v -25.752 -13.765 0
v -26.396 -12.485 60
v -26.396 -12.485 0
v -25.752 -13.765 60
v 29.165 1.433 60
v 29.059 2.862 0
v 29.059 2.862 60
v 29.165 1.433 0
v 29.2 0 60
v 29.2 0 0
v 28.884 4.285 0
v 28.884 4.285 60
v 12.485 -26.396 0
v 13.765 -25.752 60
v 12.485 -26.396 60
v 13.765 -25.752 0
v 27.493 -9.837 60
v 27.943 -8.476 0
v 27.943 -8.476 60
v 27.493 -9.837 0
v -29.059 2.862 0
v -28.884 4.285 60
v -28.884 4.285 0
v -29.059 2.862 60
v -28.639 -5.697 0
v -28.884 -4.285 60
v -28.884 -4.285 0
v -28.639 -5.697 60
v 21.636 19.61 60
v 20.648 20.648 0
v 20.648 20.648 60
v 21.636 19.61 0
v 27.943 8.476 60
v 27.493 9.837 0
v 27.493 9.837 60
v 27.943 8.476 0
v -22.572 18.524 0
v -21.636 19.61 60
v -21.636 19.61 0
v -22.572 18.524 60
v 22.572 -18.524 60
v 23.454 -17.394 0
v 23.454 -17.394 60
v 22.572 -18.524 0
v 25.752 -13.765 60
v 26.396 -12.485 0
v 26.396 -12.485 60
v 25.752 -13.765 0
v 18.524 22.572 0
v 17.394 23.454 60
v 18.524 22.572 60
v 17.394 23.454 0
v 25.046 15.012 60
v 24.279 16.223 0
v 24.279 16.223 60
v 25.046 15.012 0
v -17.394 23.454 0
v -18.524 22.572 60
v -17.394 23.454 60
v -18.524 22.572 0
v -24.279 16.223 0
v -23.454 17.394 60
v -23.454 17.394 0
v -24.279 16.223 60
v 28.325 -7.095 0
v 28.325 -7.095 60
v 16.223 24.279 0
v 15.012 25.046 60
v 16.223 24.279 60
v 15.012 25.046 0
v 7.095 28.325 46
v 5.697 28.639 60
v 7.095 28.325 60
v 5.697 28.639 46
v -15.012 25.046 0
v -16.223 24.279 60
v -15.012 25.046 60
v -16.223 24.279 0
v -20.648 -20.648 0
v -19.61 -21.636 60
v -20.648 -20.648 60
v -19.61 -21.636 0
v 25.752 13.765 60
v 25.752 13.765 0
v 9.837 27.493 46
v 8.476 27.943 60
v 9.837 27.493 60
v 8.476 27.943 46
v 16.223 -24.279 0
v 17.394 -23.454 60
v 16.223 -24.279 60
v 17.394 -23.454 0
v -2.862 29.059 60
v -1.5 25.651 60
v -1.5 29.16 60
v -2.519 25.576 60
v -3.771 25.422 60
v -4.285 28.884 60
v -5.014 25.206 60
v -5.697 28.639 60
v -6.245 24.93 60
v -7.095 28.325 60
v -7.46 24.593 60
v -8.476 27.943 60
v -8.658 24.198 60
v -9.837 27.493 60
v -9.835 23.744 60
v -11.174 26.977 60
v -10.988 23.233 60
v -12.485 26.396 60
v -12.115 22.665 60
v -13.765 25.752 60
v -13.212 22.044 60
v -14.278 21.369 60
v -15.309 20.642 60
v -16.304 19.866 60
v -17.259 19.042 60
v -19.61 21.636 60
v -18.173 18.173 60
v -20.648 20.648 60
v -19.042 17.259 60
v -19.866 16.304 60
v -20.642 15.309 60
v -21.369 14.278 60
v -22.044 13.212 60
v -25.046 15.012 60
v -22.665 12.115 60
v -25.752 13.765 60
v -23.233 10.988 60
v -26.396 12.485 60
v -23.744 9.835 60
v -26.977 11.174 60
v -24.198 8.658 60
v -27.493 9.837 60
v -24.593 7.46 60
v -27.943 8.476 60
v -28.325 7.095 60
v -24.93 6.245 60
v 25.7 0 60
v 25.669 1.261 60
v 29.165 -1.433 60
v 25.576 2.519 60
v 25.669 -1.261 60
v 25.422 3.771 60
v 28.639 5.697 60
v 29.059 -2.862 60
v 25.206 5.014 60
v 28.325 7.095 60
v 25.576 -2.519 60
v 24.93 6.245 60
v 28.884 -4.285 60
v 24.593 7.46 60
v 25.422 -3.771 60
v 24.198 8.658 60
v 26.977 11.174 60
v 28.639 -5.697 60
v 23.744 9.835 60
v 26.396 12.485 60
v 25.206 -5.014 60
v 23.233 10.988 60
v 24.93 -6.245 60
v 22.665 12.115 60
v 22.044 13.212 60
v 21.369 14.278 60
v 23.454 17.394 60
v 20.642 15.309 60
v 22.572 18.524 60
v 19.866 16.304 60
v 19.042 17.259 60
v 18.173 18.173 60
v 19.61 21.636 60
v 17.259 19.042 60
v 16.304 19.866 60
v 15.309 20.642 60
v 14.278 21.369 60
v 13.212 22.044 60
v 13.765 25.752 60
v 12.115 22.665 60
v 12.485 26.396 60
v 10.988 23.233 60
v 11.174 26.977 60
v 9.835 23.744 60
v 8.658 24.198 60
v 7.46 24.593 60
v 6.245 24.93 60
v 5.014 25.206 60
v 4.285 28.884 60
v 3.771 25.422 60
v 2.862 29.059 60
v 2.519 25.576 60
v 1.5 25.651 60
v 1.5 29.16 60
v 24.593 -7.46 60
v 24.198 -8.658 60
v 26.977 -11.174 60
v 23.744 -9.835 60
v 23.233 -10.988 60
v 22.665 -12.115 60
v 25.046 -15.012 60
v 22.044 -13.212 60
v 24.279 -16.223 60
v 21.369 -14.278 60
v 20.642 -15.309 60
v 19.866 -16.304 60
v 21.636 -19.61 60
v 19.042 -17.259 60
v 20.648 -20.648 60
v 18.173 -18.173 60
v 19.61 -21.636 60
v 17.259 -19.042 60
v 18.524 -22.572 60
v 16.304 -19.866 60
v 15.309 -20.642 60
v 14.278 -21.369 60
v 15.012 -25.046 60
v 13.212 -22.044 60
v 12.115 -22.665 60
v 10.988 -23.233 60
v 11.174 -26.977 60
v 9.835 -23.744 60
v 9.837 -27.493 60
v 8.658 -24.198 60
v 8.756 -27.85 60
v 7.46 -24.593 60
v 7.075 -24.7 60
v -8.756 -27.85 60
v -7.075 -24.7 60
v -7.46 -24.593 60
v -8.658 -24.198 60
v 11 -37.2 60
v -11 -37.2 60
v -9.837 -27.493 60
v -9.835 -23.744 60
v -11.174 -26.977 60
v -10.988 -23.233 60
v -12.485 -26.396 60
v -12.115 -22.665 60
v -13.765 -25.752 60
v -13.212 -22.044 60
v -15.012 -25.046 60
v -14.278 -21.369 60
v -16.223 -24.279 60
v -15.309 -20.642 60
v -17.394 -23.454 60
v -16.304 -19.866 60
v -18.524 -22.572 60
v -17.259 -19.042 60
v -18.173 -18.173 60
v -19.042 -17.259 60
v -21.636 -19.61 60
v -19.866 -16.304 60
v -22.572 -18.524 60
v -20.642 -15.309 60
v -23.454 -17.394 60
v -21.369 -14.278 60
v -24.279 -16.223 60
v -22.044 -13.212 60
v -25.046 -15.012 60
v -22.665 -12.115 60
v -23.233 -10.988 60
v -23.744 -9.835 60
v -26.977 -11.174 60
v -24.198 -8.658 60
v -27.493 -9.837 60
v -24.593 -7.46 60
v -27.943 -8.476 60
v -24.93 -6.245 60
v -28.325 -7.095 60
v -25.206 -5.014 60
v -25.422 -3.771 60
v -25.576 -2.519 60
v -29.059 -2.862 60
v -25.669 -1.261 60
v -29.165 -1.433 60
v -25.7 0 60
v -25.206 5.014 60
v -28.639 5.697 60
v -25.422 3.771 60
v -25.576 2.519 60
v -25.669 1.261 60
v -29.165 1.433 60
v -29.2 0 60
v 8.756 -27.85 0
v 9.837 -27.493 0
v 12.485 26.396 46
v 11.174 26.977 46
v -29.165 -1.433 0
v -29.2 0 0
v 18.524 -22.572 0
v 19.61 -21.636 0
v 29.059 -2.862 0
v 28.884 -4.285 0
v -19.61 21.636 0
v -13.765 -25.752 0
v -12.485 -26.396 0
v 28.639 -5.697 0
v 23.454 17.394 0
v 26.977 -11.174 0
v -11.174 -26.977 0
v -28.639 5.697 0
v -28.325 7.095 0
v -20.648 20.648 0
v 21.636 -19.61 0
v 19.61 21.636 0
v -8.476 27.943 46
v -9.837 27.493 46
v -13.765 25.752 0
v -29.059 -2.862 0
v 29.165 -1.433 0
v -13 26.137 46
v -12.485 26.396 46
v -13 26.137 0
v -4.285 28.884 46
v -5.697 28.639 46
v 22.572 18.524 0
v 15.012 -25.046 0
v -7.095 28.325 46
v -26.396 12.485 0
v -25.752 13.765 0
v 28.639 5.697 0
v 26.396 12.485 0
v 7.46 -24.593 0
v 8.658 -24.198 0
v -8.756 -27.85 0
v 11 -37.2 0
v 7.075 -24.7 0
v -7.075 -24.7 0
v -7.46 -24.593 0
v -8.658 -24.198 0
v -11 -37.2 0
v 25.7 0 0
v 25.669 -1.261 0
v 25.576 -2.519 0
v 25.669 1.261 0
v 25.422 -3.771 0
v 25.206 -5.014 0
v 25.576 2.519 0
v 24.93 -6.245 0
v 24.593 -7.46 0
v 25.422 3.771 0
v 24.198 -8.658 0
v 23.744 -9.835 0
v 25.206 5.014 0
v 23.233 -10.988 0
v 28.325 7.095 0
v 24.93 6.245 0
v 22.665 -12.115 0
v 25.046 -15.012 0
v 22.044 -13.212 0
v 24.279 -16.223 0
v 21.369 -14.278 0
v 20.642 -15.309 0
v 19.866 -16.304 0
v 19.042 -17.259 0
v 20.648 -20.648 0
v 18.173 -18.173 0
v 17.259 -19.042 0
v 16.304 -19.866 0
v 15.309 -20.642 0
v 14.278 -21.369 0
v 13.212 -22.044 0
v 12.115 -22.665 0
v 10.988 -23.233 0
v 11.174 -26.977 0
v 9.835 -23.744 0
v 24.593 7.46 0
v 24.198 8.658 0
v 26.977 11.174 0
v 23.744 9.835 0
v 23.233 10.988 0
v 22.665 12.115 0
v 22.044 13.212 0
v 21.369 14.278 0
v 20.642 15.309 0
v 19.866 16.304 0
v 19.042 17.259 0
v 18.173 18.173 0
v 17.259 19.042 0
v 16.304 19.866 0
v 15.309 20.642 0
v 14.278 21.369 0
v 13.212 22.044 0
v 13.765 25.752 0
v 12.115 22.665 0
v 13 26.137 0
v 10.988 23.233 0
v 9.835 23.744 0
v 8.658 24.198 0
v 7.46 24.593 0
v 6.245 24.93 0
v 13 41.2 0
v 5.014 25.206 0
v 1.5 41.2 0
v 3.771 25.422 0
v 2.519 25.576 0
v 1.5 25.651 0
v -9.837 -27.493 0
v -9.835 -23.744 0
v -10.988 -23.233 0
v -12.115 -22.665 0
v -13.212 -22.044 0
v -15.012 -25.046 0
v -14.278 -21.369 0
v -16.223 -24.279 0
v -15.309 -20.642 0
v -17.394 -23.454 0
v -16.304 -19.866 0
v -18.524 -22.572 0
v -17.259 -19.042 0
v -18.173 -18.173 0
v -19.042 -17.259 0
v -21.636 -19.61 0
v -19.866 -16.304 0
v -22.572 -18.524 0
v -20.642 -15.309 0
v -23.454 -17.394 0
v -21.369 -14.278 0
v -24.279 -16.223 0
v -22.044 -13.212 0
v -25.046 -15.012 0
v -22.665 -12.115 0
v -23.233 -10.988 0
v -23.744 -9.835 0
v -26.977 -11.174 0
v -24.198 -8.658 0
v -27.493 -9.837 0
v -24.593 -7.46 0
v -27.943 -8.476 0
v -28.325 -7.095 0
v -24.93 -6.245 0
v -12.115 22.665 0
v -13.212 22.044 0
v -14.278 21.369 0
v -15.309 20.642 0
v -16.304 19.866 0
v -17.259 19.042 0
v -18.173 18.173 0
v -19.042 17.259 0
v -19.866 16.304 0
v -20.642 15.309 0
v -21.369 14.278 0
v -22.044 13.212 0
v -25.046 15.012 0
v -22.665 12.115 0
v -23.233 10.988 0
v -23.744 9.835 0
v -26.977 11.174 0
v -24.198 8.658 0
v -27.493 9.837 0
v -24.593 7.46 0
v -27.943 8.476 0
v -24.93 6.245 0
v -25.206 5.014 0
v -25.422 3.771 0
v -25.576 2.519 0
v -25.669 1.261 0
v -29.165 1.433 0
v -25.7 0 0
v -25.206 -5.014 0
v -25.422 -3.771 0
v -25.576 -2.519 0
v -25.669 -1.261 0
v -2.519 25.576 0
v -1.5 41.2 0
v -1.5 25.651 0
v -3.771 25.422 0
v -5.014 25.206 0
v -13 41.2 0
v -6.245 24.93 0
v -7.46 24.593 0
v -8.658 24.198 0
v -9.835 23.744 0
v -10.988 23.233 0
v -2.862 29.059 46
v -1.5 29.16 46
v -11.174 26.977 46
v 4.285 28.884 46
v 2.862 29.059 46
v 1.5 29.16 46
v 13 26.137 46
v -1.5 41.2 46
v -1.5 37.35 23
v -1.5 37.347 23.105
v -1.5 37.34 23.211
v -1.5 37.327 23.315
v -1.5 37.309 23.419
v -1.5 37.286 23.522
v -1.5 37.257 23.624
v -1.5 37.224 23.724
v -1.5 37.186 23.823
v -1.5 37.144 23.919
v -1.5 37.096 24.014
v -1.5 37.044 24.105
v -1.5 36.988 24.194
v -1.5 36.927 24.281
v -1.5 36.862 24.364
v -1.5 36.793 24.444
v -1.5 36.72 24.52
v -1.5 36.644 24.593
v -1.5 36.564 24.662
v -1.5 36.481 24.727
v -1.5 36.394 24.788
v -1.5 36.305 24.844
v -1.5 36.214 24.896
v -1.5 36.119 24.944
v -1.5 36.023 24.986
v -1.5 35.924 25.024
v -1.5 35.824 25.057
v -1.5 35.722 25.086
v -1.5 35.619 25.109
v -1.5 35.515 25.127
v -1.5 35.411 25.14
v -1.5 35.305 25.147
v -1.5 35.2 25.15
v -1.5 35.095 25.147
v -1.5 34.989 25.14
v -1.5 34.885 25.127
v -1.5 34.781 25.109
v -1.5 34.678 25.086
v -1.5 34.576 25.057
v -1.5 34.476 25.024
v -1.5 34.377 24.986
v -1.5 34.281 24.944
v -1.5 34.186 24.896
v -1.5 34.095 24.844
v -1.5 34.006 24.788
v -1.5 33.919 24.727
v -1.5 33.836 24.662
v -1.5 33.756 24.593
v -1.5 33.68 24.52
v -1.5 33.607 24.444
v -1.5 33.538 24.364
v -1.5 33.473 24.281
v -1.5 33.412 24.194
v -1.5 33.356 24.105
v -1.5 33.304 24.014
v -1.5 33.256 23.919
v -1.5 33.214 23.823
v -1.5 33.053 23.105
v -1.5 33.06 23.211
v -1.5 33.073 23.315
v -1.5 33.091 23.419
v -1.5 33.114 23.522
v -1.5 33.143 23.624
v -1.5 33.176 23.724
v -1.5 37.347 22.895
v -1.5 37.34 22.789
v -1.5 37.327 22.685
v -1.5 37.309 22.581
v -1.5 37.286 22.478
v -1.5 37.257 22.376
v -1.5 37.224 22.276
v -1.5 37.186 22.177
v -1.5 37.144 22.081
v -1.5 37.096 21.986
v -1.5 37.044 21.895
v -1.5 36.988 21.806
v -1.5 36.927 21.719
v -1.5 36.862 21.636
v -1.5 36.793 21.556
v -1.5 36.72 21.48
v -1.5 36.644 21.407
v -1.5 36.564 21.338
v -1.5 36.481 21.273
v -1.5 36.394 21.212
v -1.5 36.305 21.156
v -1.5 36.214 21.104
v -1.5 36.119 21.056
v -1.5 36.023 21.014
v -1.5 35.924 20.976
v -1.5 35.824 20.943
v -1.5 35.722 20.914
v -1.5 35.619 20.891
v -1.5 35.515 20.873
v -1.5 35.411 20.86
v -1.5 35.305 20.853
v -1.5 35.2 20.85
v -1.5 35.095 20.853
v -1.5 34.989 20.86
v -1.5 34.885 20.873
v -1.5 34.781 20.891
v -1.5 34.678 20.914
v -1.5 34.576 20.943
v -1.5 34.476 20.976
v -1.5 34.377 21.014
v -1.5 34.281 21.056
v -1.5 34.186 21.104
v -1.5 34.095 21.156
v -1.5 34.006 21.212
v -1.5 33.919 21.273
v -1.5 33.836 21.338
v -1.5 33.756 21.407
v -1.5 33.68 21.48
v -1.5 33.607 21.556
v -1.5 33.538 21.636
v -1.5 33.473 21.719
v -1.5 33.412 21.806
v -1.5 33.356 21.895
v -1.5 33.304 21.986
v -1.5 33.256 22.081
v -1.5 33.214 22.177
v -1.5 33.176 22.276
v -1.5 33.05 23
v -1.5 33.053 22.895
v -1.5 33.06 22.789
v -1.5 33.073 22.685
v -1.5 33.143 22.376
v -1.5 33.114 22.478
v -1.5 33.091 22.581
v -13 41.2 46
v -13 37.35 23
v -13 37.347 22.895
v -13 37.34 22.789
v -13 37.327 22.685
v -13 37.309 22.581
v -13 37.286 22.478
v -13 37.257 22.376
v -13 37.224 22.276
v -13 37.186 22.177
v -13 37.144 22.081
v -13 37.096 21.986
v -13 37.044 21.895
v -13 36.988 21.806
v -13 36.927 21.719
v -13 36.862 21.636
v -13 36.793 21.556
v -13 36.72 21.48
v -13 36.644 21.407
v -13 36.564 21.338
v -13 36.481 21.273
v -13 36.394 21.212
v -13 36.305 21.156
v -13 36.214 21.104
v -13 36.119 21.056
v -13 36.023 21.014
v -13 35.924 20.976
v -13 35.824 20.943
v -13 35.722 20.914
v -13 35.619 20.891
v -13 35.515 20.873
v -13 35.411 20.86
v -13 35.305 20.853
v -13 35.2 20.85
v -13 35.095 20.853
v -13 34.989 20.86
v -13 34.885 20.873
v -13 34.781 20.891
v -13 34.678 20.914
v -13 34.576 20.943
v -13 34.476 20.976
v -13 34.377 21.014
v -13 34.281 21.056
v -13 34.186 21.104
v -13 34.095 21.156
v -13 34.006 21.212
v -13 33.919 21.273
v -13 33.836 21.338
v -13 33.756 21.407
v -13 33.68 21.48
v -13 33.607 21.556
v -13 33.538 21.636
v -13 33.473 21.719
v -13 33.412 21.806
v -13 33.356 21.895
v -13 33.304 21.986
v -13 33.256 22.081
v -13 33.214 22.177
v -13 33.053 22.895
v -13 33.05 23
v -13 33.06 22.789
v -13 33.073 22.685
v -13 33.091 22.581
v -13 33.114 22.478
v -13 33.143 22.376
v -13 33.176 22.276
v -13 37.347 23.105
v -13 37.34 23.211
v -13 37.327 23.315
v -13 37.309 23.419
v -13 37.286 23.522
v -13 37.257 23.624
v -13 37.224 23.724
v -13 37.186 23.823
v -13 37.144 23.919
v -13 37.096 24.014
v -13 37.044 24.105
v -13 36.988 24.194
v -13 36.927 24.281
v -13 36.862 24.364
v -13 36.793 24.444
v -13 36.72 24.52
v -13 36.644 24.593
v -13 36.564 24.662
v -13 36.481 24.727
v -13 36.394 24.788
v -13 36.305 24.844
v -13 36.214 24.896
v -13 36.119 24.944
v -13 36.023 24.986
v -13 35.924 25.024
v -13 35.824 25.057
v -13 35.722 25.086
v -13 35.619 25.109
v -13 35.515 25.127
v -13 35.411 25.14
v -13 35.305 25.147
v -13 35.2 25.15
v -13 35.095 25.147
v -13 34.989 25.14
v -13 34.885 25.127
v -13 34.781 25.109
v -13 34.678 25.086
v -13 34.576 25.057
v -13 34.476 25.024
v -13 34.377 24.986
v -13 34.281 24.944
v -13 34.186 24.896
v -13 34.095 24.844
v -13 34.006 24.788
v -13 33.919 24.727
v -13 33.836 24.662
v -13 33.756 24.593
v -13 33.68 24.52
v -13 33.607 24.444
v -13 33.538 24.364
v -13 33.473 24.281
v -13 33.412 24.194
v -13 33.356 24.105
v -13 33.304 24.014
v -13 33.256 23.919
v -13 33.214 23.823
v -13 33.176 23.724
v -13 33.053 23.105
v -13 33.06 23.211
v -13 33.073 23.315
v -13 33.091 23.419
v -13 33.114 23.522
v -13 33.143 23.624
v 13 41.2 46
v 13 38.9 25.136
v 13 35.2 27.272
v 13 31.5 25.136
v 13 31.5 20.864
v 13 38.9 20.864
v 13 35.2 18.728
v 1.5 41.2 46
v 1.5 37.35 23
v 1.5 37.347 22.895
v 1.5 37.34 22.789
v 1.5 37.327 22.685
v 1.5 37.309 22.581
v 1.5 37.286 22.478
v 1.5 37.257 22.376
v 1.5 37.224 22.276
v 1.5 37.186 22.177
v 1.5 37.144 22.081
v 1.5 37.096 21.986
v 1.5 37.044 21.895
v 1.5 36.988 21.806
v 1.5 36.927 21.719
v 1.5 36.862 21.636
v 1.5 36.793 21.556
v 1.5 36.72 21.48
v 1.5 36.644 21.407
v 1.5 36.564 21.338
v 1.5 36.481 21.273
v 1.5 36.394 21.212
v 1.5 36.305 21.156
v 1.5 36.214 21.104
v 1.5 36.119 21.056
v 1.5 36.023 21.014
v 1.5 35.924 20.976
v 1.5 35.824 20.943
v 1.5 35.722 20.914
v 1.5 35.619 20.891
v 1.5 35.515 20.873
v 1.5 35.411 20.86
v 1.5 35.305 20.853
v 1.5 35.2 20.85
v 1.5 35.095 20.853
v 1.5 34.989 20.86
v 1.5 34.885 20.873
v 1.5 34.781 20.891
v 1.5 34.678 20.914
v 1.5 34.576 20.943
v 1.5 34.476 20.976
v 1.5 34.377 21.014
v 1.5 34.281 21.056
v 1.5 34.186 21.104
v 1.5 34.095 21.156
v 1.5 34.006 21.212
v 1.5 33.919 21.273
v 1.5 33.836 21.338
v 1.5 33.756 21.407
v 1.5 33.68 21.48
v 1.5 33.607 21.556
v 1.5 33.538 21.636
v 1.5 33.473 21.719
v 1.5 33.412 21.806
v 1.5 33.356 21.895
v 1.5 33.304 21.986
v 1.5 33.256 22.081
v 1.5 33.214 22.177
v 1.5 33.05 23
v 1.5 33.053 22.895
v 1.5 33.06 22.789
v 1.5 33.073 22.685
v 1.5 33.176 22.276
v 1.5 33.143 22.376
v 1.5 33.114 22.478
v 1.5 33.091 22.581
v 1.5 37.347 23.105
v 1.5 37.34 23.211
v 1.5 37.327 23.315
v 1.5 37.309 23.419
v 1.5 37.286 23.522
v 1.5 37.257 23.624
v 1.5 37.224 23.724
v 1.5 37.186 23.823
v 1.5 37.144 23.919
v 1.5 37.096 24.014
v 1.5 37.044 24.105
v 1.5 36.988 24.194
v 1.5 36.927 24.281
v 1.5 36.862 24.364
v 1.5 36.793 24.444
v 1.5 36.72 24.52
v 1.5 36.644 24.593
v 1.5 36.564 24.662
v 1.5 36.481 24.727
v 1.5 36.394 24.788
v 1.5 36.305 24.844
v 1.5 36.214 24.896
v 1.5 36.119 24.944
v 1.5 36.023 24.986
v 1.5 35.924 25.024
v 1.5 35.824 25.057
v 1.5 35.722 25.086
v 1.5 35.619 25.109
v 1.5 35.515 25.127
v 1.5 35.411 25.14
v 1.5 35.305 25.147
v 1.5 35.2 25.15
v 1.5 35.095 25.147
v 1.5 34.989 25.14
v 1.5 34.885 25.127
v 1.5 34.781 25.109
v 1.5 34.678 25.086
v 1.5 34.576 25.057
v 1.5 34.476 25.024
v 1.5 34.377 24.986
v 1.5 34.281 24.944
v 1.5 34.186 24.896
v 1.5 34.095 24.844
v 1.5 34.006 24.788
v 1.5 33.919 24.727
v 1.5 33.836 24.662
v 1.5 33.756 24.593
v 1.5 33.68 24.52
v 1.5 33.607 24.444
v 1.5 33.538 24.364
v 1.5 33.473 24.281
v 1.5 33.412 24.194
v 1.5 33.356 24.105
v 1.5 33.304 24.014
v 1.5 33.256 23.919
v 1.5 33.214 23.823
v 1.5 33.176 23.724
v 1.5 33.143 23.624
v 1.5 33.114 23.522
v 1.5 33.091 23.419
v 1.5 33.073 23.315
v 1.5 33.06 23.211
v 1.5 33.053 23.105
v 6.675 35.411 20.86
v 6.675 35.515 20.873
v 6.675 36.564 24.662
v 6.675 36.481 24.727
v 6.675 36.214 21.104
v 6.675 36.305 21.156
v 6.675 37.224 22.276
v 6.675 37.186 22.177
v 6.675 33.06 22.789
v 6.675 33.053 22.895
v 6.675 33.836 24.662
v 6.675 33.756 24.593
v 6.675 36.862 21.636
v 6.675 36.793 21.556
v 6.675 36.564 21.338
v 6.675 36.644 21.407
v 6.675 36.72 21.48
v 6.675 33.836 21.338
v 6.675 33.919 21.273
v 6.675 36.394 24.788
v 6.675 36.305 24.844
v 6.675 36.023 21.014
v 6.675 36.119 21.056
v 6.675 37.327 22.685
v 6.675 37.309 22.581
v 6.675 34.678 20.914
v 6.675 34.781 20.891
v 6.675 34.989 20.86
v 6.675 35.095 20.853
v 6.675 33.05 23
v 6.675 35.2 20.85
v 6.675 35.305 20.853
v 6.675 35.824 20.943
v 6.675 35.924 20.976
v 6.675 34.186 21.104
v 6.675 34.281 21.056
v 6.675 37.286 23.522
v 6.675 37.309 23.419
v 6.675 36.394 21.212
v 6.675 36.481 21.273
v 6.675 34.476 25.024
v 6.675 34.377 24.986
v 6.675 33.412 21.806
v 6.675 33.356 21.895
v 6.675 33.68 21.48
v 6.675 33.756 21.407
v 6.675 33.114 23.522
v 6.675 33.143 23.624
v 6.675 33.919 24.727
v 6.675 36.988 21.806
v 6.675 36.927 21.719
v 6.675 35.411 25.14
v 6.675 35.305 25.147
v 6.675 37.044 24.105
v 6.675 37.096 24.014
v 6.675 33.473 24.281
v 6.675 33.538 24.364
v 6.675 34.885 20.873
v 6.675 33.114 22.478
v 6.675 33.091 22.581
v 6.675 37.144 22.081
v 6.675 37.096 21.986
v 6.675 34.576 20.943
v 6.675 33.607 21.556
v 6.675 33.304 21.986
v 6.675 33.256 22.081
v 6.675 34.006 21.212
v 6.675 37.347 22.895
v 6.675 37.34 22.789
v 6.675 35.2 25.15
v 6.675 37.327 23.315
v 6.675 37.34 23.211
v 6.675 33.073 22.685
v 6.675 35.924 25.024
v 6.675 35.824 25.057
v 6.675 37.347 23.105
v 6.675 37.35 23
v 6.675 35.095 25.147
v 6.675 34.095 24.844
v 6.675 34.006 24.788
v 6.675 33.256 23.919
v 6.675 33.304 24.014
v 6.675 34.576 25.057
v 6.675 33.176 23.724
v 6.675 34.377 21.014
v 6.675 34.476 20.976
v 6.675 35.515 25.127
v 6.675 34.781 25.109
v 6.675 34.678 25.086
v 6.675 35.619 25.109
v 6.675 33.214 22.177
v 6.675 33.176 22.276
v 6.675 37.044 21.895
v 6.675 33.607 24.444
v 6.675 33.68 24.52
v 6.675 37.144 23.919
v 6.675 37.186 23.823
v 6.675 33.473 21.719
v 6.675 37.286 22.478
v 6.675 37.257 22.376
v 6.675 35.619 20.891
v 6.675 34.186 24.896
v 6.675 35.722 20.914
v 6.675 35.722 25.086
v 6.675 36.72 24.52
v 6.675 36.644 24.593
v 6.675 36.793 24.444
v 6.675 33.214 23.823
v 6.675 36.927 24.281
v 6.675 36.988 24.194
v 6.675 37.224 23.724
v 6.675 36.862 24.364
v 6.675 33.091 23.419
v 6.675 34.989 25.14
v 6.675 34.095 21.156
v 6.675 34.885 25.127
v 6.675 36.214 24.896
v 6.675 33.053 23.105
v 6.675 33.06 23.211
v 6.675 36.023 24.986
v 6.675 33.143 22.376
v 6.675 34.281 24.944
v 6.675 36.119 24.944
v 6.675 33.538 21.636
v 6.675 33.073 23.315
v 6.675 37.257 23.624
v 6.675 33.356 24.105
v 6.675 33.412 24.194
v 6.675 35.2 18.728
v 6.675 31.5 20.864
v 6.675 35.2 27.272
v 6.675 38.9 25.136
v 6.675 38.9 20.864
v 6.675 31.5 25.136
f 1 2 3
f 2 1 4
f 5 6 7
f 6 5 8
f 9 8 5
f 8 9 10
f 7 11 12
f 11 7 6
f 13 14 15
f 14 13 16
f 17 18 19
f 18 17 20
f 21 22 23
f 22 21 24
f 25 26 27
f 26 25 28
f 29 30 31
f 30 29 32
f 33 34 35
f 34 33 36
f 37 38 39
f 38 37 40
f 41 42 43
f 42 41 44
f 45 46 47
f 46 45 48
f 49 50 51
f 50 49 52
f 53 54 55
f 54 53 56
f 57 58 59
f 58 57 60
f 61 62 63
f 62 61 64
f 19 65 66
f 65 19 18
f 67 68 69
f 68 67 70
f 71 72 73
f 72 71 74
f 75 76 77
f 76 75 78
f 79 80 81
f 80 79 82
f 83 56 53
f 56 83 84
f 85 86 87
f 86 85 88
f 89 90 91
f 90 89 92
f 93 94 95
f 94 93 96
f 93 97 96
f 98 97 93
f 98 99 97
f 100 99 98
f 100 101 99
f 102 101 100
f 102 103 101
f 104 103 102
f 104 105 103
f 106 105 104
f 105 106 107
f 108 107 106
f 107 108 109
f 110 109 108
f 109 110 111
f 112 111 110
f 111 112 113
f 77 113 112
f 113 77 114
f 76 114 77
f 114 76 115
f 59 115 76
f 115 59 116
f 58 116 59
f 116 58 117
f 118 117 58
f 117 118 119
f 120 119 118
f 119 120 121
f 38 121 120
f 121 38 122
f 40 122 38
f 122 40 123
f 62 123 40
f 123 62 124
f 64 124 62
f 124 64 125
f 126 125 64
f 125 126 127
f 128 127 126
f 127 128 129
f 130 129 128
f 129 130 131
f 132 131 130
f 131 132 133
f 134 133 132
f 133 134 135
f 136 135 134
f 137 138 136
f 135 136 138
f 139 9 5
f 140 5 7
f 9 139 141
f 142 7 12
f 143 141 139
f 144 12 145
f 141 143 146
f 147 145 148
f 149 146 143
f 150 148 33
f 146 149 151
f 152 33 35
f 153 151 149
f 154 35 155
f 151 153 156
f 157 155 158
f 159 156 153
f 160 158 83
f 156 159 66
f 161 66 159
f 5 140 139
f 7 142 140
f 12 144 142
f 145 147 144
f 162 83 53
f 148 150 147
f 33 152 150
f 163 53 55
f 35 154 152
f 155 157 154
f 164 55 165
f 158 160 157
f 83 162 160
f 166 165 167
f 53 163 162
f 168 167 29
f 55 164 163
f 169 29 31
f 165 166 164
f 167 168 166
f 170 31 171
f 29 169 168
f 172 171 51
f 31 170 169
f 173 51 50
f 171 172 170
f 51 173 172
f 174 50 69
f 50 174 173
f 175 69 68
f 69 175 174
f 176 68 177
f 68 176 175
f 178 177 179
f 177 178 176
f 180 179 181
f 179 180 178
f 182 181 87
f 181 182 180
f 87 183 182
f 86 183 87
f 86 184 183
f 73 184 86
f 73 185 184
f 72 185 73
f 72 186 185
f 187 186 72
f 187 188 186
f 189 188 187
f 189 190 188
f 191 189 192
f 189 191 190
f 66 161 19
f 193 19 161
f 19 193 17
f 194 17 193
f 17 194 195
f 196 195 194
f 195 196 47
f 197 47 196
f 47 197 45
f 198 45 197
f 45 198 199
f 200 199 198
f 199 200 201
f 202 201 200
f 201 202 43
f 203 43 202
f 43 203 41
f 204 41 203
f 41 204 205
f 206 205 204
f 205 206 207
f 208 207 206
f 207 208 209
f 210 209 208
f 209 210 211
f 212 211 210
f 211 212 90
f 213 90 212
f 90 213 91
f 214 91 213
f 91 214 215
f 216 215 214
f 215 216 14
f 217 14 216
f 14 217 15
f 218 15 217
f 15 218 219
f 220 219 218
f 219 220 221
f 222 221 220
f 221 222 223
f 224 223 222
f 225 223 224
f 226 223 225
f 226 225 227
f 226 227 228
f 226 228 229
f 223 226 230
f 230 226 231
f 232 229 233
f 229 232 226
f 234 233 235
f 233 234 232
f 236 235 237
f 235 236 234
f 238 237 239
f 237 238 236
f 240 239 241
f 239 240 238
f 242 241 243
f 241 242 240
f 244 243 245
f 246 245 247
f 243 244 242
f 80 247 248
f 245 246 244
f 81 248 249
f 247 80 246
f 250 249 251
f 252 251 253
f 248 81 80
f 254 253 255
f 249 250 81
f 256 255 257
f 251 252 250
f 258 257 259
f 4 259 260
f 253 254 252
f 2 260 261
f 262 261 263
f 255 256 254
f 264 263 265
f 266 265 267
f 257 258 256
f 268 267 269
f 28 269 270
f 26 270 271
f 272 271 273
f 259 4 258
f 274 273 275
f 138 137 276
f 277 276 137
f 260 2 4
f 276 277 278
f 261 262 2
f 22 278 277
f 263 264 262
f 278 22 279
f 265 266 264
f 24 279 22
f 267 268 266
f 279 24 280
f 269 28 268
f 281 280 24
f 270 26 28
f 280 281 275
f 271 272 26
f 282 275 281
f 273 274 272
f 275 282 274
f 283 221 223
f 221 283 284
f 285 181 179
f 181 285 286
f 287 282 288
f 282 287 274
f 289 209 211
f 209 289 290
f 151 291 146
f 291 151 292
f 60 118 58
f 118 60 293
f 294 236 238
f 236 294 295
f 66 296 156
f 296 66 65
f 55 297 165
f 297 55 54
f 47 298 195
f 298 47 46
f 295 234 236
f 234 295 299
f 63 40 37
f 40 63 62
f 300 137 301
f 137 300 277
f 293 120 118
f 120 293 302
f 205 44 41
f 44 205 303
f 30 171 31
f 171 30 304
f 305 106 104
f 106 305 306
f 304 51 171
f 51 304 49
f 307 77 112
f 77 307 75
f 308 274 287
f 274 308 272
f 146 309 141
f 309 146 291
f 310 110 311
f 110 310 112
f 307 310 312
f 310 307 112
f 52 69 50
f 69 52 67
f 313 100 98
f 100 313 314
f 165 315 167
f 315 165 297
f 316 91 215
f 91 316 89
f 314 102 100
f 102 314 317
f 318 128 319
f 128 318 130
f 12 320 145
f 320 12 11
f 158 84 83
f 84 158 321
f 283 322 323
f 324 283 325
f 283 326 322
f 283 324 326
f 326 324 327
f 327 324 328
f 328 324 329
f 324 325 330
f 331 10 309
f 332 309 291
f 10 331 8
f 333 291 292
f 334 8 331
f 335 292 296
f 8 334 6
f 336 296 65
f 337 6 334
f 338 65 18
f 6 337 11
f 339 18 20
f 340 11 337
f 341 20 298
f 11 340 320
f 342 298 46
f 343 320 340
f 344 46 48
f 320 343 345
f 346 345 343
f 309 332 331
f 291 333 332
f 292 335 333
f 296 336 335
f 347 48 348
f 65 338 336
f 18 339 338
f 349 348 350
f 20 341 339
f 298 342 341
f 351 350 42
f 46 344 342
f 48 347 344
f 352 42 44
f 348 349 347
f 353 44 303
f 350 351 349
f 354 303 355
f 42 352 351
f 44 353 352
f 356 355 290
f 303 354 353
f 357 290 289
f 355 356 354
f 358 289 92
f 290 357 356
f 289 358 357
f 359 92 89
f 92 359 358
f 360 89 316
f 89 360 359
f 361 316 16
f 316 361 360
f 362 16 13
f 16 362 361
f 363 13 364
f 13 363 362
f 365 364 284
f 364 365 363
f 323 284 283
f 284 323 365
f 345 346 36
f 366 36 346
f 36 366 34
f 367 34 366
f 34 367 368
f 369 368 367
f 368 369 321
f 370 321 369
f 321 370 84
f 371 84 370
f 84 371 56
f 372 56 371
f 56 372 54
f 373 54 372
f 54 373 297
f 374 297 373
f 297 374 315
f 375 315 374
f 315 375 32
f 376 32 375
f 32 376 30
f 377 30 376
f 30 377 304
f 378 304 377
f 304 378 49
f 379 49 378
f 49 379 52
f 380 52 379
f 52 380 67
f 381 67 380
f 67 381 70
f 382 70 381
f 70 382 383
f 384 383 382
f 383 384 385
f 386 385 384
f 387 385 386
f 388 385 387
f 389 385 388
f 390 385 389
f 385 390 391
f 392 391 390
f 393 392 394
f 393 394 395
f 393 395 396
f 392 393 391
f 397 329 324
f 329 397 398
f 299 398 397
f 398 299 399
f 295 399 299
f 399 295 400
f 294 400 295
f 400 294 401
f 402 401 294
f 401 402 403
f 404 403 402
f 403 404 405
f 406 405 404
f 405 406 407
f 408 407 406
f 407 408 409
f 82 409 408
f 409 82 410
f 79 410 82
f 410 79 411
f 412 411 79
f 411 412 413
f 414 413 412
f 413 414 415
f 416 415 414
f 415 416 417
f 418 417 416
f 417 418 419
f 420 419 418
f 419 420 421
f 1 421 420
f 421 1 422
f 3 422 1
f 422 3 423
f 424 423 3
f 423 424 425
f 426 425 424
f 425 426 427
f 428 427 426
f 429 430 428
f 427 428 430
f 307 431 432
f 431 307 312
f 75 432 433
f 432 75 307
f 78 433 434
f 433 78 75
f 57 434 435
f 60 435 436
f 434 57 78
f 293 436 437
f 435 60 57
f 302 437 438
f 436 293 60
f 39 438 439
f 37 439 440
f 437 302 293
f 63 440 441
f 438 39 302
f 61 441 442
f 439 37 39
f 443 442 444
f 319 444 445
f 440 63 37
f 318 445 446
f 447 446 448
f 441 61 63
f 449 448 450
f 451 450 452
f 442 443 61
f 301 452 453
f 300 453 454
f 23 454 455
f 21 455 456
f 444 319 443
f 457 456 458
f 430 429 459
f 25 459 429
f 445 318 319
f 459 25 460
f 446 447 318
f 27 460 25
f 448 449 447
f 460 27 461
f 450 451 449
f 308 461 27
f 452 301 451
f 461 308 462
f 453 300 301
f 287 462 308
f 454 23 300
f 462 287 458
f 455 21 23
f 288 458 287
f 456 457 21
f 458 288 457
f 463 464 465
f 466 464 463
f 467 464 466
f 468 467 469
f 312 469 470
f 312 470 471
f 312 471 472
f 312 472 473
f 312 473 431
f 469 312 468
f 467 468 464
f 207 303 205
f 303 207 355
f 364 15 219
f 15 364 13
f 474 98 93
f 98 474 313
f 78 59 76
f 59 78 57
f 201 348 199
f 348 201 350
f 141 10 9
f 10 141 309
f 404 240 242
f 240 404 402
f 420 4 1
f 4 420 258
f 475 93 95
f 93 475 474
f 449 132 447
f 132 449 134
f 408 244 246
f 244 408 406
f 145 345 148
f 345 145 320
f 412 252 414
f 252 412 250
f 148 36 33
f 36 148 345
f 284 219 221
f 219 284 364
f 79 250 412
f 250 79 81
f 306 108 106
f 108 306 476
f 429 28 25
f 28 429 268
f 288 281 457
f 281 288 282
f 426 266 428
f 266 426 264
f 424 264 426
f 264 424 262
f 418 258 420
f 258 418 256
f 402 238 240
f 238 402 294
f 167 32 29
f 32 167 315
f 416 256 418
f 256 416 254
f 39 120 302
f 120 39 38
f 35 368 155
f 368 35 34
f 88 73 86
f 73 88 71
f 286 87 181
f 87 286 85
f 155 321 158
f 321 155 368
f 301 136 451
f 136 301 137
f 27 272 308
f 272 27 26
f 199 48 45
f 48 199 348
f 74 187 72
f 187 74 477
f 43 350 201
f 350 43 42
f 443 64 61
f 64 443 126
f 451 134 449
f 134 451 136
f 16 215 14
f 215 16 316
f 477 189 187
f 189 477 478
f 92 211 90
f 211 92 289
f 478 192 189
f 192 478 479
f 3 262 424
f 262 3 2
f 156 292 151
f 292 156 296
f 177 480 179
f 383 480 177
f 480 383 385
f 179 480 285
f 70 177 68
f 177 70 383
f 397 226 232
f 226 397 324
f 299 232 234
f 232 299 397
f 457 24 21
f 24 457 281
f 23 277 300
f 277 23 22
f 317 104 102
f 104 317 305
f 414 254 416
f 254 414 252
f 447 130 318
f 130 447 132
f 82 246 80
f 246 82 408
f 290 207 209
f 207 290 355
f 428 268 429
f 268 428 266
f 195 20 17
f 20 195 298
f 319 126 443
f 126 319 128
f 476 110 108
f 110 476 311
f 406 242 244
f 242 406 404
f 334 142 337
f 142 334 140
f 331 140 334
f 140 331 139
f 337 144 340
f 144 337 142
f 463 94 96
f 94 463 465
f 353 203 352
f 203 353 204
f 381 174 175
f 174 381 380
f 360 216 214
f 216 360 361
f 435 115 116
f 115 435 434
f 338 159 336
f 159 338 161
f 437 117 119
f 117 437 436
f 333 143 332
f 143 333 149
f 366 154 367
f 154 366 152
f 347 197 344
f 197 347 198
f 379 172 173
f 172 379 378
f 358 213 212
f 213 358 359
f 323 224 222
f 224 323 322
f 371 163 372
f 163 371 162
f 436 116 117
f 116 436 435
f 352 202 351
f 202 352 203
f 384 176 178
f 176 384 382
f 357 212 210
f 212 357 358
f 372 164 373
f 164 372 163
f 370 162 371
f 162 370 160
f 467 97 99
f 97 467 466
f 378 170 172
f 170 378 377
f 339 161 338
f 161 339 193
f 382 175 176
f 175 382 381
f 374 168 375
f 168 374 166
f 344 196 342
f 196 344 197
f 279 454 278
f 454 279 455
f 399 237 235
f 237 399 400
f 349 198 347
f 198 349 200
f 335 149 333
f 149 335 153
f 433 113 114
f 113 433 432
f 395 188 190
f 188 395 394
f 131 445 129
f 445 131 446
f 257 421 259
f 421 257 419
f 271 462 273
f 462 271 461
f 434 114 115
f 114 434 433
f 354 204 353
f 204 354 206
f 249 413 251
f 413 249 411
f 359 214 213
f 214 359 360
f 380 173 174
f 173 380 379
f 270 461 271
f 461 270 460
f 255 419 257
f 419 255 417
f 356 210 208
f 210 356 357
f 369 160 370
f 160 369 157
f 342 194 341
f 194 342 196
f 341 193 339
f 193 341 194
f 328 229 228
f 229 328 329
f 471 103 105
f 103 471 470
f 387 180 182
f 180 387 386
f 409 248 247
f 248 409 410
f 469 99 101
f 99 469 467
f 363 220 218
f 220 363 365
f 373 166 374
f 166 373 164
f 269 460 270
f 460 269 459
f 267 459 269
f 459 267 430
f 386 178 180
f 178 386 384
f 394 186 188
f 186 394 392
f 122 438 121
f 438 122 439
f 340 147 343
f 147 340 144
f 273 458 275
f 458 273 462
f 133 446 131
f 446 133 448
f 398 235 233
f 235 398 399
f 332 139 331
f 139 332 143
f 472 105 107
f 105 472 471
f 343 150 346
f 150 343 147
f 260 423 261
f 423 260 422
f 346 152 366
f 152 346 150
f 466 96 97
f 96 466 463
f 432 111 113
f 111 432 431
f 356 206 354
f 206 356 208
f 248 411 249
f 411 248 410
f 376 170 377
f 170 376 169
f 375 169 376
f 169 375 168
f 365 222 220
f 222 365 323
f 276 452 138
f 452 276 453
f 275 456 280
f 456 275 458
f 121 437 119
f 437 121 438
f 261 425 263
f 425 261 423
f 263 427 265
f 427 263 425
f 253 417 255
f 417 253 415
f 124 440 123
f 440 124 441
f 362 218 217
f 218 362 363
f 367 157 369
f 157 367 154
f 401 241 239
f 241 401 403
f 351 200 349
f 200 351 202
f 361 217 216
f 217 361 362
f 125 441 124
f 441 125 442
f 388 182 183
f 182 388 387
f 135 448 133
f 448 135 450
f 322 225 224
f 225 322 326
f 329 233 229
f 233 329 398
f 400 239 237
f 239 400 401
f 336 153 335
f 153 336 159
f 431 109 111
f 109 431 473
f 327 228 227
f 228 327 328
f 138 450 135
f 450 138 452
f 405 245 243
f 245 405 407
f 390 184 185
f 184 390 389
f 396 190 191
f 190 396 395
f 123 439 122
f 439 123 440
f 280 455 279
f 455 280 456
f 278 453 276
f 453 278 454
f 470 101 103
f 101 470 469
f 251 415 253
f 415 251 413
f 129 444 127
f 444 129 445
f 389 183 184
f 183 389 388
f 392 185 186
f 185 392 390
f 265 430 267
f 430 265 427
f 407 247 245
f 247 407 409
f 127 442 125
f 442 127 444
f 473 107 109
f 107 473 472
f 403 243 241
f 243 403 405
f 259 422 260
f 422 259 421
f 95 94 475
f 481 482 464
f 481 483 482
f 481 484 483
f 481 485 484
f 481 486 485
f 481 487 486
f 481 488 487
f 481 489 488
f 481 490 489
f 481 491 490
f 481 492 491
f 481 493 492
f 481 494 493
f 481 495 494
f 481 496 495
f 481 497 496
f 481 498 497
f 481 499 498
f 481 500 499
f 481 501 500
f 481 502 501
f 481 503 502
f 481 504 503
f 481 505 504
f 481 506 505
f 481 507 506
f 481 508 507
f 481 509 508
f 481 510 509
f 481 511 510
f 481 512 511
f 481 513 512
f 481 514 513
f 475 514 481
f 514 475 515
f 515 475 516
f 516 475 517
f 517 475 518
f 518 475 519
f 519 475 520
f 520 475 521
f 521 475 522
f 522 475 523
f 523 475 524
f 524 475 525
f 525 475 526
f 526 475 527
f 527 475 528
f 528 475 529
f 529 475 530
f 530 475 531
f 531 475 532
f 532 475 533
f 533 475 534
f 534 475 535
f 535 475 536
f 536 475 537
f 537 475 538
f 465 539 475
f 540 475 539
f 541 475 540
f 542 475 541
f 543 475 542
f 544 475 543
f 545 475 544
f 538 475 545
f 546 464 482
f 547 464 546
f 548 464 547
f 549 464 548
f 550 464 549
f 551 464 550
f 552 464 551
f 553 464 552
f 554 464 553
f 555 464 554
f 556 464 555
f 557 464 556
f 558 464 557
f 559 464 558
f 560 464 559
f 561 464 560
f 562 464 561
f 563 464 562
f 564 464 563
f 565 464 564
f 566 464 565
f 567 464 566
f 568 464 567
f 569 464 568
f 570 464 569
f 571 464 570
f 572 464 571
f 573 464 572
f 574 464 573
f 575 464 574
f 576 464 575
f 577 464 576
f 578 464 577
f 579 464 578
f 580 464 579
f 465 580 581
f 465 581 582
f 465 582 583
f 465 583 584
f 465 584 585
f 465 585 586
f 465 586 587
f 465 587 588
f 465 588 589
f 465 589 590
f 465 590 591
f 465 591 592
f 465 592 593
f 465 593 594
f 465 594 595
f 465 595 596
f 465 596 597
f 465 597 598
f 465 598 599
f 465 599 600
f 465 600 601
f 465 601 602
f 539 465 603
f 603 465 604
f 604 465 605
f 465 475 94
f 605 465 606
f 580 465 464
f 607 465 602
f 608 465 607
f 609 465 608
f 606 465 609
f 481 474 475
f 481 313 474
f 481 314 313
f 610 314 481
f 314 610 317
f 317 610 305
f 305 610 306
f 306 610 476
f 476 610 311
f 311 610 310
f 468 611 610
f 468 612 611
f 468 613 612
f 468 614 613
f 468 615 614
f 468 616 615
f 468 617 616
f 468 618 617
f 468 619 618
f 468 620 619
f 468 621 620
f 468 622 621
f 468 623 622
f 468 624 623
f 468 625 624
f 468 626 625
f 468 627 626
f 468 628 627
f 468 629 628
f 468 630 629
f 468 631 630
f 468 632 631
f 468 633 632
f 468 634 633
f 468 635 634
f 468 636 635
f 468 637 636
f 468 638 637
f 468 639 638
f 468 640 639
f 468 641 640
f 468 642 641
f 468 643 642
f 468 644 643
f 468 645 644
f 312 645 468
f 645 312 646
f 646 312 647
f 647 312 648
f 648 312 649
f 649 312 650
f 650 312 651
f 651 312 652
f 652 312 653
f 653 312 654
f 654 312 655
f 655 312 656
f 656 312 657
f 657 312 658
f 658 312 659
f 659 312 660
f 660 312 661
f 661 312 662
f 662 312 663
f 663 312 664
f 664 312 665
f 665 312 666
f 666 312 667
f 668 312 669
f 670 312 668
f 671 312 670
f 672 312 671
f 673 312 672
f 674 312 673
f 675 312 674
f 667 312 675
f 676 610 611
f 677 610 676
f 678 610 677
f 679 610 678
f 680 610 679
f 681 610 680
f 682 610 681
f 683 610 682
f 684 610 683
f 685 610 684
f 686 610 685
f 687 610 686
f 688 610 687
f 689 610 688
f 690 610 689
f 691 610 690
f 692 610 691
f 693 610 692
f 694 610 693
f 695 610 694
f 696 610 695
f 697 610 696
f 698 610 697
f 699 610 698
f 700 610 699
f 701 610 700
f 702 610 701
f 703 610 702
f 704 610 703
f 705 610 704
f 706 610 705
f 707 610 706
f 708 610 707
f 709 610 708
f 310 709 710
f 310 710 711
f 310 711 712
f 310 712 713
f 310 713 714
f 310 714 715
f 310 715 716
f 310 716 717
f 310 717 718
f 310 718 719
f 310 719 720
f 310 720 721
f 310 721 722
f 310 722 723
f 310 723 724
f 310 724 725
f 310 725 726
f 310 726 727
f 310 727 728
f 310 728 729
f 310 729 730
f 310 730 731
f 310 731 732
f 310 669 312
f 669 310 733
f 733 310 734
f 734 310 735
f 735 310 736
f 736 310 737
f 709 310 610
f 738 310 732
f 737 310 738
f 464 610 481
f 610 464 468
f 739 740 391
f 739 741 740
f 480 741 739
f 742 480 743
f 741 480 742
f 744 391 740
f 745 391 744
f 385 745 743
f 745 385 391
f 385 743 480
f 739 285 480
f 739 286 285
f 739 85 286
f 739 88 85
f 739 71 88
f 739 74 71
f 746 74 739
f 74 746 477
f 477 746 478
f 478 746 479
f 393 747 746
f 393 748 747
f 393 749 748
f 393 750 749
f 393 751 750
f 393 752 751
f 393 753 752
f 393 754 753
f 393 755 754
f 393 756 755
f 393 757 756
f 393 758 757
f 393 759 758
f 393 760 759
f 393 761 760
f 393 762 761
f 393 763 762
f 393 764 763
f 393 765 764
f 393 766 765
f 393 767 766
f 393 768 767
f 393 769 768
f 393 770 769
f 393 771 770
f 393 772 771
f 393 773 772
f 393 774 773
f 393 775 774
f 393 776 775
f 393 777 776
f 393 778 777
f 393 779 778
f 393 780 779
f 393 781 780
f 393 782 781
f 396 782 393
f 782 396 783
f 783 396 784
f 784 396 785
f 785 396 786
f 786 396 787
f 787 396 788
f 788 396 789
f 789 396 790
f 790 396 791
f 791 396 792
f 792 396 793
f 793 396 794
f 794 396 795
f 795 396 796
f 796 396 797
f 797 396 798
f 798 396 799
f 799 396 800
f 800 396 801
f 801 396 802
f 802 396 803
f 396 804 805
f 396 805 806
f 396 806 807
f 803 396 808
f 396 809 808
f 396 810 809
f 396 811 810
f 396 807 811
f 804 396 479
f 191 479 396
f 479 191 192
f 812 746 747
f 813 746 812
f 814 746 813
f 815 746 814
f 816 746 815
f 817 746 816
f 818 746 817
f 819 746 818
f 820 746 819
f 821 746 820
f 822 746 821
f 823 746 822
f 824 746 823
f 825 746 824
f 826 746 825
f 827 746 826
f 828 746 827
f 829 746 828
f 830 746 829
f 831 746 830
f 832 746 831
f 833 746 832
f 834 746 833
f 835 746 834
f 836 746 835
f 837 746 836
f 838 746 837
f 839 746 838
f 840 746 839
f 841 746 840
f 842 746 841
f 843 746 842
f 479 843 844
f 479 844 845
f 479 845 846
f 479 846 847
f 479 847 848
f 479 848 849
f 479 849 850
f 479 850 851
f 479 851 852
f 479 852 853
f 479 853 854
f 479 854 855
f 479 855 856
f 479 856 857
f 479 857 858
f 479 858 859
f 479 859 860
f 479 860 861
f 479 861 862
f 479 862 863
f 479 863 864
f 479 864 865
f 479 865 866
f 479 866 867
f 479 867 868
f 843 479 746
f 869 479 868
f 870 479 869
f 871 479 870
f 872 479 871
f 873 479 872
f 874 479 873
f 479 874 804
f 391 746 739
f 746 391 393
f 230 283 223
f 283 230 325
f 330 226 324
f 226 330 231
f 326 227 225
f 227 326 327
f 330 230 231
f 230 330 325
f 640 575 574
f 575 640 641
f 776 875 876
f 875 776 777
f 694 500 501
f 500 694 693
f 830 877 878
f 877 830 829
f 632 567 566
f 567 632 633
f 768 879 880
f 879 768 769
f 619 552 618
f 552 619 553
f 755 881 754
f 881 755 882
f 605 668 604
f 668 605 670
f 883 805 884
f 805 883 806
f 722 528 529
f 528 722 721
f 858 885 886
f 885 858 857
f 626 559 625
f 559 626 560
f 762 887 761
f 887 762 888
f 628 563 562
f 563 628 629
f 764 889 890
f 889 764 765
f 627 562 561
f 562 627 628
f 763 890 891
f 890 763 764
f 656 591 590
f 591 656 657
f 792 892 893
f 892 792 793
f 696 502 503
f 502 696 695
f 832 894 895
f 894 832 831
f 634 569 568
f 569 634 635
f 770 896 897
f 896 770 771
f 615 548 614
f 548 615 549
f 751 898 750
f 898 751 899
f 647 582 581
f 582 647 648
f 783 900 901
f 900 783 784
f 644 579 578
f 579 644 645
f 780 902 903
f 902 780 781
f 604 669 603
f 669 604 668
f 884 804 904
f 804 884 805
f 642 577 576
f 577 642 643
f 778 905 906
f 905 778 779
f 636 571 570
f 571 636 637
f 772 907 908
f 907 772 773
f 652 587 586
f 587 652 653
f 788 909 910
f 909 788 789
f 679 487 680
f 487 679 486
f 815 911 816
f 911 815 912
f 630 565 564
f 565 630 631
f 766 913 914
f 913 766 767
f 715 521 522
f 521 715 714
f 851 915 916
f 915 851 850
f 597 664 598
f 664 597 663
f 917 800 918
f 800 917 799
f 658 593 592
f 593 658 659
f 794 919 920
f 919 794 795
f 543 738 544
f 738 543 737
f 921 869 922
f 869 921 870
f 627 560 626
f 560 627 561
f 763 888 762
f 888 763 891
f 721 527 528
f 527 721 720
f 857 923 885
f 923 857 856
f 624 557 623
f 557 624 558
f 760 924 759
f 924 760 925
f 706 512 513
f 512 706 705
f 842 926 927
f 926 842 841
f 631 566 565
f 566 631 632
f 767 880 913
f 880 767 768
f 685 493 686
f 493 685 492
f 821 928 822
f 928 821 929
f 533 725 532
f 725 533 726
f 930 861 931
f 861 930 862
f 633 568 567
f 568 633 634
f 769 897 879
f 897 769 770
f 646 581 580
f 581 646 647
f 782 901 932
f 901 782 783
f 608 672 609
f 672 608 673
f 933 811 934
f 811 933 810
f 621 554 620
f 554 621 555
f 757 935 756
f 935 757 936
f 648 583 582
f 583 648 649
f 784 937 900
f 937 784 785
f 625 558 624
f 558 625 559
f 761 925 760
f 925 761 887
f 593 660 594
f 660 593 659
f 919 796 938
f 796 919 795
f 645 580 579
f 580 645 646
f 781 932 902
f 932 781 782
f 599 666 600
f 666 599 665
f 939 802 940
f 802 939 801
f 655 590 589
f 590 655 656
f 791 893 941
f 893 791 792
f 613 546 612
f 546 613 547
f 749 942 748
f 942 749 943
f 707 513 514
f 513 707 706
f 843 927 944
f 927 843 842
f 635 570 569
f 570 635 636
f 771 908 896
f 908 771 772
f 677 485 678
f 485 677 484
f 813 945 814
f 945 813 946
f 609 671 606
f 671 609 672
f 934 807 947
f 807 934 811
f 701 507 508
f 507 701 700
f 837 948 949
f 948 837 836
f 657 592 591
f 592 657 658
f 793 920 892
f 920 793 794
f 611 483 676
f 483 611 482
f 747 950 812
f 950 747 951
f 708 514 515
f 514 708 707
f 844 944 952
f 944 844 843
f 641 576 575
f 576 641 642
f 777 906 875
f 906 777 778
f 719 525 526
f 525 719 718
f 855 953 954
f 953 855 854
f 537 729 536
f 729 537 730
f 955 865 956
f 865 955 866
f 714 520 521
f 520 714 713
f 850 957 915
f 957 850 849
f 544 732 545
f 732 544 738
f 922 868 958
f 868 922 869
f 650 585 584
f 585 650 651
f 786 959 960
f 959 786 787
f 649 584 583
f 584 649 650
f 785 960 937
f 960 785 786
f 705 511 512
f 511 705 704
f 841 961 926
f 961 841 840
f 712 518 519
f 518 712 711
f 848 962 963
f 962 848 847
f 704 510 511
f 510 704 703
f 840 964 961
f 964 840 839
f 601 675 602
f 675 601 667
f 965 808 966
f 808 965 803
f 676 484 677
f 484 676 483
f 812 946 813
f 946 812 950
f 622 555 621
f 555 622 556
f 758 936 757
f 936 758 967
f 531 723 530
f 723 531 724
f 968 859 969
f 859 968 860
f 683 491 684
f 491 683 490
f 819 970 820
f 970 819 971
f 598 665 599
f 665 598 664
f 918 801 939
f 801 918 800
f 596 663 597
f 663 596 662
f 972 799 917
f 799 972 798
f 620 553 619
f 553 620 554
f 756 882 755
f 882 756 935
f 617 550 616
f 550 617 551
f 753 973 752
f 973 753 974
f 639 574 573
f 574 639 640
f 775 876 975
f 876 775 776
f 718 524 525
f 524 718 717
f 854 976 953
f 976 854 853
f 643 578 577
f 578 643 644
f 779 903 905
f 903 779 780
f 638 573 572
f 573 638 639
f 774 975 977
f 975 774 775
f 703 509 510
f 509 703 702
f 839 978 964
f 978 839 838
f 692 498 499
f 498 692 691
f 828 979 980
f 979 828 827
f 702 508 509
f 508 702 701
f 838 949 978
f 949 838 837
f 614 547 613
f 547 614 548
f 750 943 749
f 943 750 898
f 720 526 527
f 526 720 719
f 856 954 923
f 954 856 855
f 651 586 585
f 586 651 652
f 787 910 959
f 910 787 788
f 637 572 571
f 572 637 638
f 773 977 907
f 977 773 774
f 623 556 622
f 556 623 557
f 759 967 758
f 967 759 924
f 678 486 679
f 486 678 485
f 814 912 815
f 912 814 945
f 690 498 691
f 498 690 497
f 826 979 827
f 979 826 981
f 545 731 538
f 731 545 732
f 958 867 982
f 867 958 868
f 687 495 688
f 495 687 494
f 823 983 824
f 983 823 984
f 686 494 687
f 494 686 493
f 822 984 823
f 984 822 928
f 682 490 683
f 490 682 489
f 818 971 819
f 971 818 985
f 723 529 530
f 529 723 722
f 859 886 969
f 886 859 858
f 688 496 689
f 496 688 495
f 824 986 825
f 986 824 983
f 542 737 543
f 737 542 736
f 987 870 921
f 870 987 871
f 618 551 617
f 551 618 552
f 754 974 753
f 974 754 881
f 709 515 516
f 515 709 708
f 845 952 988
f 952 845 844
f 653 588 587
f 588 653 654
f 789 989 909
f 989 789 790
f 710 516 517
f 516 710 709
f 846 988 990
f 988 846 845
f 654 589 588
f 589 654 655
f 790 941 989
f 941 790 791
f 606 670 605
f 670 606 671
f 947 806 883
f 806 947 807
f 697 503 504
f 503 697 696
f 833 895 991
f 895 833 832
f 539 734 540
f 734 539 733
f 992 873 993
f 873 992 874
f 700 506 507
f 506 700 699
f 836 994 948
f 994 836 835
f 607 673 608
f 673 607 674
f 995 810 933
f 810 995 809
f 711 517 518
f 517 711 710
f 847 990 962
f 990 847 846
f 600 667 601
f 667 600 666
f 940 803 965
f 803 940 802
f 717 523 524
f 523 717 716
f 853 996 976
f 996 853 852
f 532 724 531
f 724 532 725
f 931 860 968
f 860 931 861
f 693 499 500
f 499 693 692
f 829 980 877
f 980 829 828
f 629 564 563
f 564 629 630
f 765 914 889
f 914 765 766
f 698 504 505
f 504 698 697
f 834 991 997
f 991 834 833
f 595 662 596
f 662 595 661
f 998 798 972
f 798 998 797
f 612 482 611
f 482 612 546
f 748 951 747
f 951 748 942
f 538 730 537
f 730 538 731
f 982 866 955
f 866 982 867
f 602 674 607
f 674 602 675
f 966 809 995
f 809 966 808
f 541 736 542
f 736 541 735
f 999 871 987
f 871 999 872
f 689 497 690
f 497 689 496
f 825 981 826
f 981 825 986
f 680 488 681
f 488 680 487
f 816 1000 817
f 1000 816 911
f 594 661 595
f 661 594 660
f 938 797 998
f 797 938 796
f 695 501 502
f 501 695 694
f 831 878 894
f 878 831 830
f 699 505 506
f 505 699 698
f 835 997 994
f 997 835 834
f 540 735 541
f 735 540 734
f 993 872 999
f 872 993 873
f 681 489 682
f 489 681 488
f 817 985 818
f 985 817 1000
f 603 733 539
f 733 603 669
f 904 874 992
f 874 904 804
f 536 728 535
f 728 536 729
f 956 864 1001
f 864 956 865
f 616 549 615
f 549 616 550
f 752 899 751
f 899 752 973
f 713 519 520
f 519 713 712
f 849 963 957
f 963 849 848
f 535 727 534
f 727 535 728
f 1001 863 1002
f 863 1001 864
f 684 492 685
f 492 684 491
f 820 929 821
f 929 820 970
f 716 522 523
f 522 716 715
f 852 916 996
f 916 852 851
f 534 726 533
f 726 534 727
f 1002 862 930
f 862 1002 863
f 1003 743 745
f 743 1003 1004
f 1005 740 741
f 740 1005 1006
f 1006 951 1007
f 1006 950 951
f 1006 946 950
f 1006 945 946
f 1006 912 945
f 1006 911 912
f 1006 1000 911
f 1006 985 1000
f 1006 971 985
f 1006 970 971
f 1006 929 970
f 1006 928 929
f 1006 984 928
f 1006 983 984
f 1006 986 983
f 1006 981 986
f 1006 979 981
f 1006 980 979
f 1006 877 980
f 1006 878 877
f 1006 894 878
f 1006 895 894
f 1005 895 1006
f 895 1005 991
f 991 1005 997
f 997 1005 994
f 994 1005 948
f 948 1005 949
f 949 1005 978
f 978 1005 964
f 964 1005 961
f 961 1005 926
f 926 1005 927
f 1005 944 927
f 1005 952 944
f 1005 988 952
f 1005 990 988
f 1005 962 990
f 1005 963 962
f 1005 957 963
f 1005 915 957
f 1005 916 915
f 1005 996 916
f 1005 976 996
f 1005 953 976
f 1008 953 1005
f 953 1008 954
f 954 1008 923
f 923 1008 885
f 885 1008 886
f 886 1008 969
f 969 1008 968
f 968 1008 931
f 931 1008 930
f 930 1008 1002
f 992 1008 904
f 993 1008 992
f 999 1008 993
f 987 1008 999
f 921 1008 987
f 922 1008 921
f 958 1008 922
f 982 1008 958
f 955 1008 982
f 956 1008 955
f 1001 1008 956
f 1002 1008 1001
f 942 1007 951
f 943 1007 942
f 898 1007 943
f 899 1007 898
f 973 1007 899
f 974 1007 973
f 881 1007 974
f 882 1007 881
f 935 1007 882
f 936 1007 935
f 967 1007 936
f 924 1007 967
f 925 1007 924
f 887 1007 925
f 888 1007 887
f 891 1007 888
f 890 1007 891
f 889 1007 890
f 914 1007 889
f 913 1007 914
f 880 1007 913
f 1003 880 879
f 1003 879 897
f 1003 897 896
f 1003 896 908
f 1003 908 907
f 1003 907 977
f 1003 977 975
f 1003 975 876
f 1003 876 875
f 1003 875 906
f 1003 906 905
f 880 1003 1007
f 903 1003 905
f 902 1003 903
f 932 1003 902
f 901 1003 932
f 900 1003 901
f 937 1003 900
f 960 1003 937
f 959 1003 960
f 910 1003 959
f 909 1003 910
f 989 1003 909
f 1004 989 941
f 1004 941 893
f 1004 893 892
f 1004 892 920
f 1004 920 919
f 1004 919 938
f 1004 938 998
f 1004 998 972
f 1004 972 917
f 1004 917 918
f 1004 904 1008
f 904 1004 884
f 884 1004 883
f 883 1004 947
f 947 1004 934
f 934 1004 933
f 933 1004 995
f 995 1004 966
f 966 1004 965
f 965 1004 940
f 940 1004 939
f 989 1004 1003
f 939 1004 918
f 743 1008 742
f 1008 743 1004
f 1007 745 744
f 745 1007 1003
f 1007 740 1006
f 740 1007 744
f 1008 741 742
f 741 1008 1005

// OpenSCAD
// =====================================================================
//  Empuñadura (mango barril con abrazadera) para motor XD-3420
//  Sujeta el cuerpo Ø51 mm apretando un tornillo M4 (clamp tipo C).
//  Cola de milano inferior -> encaja deslizando en la base (2 en 1).
//  Imprimir DE PIE (eje Z), sin soportes.
// =====================================================================

/* [Motor] */
MOTOR_D = 51;     // diametro del cuerpo del motor (mm)
FIT     = 0.4;    // holgura del clamp (lo cierra el tornillo)

/* [Mango] */
WALL    = 3.5;    // espesor de pared
LEN     = 60;     // longitud del mango

/* [Abrazadera] */
SLIT    = 3;      // ancho de la ranura de la C
EAR_X   = 11.5;   // ancho de cada orejeta
EAR_OUT = 12;     // cuanto sobresalen las orejetas
EAR_Z0  = 0;      // base de las orejetas (0 = sin voladizo)
EAR_Z1  = 46;     // alto de las orejetas
M4_CLEAR = 4.3;   // paso del tornillo M4
M4_NUT_AF = 7;    // tuerca M4 entre caras
M4_NUT_CL = 0.4;

/* [Cola de milano - dock] */
DT_TOP_W = 16;    // ancho en la raiz
DT_BOT_W = 22;    // ancho en la punta (mas ancho = bloquea)
DT_H     = 8;     // altura

$fn = 128;

RIN  = (MOTOR_D+FIT)/2;
ROUT = RIN + WALL;
BOLT_Y = ROUT + 6;
BOLT_Z = (EAR_Z0+EAR_Z1)/2;

module body(){
    difference(){
        cylinder(r=ROUT, h=LEN);
        translate([0,0,-1]) cylinder(r=RIN, h=LEN+2);
    }
}
module ears(){
    for(s=[-1,1])
        translate([s*(SLIT/2+EAR_X/2), (RIN+ROUT+EAR_OUT)/2, (EAR_Z0+EAR_Z1)/2])
            cube([EAR_X, (ROUT+EAR_OUT)-RIN, EAR_Z1-EAR_Z0], center=true);
}
module dovetail(){
    linear_extrude(LEN)
        polygon([[-DT_BOT_W/2,-(ROUT+DT_H)],[DT_BOT_W/2,-(ROUT+DT_H)],
                 [DT_TOP_W/2,-RIN+1],[-DT_TOP_W/2,-RIN+1]]);
}
module cuts(){
    // ranura de la C
    translate([0,(RIN-2+ROUT+EAR_OUT+5)/2, LEN/2])
        cube([SLIT,(ROUT+EAR_OUT+5)-(RIN-2),LEN+4],center=true);
    // tornillo M4: paso desde -X
    translate([0,BOLT_Y,BOLT_Z]) rotate([0,90,0])
        translate([0,0,-(ROUT+EAR_OUT+1)])
            cylinder(d=M4_CLEAR, h=(ROUT+EAR_OUT+1)+(SLIT/2+EAR_X));
    // tuerca M4 cautiva en la orejeta +X
    translate([0,BOLT_Y,BOLT_Z]) rotate([0,90,0])
        translate([0,0,(SLIT/2+EAR_X)-EAR_X*0.55])
            cylinder(r=(M4_NUT_AF+M4_NUT_CL)/2/cos(30), h=EAR_X*0.55+0.1, $fn=6);
}
difference(){
    union(){ body(); ears(); dovetail(); }
    cuts();
}
